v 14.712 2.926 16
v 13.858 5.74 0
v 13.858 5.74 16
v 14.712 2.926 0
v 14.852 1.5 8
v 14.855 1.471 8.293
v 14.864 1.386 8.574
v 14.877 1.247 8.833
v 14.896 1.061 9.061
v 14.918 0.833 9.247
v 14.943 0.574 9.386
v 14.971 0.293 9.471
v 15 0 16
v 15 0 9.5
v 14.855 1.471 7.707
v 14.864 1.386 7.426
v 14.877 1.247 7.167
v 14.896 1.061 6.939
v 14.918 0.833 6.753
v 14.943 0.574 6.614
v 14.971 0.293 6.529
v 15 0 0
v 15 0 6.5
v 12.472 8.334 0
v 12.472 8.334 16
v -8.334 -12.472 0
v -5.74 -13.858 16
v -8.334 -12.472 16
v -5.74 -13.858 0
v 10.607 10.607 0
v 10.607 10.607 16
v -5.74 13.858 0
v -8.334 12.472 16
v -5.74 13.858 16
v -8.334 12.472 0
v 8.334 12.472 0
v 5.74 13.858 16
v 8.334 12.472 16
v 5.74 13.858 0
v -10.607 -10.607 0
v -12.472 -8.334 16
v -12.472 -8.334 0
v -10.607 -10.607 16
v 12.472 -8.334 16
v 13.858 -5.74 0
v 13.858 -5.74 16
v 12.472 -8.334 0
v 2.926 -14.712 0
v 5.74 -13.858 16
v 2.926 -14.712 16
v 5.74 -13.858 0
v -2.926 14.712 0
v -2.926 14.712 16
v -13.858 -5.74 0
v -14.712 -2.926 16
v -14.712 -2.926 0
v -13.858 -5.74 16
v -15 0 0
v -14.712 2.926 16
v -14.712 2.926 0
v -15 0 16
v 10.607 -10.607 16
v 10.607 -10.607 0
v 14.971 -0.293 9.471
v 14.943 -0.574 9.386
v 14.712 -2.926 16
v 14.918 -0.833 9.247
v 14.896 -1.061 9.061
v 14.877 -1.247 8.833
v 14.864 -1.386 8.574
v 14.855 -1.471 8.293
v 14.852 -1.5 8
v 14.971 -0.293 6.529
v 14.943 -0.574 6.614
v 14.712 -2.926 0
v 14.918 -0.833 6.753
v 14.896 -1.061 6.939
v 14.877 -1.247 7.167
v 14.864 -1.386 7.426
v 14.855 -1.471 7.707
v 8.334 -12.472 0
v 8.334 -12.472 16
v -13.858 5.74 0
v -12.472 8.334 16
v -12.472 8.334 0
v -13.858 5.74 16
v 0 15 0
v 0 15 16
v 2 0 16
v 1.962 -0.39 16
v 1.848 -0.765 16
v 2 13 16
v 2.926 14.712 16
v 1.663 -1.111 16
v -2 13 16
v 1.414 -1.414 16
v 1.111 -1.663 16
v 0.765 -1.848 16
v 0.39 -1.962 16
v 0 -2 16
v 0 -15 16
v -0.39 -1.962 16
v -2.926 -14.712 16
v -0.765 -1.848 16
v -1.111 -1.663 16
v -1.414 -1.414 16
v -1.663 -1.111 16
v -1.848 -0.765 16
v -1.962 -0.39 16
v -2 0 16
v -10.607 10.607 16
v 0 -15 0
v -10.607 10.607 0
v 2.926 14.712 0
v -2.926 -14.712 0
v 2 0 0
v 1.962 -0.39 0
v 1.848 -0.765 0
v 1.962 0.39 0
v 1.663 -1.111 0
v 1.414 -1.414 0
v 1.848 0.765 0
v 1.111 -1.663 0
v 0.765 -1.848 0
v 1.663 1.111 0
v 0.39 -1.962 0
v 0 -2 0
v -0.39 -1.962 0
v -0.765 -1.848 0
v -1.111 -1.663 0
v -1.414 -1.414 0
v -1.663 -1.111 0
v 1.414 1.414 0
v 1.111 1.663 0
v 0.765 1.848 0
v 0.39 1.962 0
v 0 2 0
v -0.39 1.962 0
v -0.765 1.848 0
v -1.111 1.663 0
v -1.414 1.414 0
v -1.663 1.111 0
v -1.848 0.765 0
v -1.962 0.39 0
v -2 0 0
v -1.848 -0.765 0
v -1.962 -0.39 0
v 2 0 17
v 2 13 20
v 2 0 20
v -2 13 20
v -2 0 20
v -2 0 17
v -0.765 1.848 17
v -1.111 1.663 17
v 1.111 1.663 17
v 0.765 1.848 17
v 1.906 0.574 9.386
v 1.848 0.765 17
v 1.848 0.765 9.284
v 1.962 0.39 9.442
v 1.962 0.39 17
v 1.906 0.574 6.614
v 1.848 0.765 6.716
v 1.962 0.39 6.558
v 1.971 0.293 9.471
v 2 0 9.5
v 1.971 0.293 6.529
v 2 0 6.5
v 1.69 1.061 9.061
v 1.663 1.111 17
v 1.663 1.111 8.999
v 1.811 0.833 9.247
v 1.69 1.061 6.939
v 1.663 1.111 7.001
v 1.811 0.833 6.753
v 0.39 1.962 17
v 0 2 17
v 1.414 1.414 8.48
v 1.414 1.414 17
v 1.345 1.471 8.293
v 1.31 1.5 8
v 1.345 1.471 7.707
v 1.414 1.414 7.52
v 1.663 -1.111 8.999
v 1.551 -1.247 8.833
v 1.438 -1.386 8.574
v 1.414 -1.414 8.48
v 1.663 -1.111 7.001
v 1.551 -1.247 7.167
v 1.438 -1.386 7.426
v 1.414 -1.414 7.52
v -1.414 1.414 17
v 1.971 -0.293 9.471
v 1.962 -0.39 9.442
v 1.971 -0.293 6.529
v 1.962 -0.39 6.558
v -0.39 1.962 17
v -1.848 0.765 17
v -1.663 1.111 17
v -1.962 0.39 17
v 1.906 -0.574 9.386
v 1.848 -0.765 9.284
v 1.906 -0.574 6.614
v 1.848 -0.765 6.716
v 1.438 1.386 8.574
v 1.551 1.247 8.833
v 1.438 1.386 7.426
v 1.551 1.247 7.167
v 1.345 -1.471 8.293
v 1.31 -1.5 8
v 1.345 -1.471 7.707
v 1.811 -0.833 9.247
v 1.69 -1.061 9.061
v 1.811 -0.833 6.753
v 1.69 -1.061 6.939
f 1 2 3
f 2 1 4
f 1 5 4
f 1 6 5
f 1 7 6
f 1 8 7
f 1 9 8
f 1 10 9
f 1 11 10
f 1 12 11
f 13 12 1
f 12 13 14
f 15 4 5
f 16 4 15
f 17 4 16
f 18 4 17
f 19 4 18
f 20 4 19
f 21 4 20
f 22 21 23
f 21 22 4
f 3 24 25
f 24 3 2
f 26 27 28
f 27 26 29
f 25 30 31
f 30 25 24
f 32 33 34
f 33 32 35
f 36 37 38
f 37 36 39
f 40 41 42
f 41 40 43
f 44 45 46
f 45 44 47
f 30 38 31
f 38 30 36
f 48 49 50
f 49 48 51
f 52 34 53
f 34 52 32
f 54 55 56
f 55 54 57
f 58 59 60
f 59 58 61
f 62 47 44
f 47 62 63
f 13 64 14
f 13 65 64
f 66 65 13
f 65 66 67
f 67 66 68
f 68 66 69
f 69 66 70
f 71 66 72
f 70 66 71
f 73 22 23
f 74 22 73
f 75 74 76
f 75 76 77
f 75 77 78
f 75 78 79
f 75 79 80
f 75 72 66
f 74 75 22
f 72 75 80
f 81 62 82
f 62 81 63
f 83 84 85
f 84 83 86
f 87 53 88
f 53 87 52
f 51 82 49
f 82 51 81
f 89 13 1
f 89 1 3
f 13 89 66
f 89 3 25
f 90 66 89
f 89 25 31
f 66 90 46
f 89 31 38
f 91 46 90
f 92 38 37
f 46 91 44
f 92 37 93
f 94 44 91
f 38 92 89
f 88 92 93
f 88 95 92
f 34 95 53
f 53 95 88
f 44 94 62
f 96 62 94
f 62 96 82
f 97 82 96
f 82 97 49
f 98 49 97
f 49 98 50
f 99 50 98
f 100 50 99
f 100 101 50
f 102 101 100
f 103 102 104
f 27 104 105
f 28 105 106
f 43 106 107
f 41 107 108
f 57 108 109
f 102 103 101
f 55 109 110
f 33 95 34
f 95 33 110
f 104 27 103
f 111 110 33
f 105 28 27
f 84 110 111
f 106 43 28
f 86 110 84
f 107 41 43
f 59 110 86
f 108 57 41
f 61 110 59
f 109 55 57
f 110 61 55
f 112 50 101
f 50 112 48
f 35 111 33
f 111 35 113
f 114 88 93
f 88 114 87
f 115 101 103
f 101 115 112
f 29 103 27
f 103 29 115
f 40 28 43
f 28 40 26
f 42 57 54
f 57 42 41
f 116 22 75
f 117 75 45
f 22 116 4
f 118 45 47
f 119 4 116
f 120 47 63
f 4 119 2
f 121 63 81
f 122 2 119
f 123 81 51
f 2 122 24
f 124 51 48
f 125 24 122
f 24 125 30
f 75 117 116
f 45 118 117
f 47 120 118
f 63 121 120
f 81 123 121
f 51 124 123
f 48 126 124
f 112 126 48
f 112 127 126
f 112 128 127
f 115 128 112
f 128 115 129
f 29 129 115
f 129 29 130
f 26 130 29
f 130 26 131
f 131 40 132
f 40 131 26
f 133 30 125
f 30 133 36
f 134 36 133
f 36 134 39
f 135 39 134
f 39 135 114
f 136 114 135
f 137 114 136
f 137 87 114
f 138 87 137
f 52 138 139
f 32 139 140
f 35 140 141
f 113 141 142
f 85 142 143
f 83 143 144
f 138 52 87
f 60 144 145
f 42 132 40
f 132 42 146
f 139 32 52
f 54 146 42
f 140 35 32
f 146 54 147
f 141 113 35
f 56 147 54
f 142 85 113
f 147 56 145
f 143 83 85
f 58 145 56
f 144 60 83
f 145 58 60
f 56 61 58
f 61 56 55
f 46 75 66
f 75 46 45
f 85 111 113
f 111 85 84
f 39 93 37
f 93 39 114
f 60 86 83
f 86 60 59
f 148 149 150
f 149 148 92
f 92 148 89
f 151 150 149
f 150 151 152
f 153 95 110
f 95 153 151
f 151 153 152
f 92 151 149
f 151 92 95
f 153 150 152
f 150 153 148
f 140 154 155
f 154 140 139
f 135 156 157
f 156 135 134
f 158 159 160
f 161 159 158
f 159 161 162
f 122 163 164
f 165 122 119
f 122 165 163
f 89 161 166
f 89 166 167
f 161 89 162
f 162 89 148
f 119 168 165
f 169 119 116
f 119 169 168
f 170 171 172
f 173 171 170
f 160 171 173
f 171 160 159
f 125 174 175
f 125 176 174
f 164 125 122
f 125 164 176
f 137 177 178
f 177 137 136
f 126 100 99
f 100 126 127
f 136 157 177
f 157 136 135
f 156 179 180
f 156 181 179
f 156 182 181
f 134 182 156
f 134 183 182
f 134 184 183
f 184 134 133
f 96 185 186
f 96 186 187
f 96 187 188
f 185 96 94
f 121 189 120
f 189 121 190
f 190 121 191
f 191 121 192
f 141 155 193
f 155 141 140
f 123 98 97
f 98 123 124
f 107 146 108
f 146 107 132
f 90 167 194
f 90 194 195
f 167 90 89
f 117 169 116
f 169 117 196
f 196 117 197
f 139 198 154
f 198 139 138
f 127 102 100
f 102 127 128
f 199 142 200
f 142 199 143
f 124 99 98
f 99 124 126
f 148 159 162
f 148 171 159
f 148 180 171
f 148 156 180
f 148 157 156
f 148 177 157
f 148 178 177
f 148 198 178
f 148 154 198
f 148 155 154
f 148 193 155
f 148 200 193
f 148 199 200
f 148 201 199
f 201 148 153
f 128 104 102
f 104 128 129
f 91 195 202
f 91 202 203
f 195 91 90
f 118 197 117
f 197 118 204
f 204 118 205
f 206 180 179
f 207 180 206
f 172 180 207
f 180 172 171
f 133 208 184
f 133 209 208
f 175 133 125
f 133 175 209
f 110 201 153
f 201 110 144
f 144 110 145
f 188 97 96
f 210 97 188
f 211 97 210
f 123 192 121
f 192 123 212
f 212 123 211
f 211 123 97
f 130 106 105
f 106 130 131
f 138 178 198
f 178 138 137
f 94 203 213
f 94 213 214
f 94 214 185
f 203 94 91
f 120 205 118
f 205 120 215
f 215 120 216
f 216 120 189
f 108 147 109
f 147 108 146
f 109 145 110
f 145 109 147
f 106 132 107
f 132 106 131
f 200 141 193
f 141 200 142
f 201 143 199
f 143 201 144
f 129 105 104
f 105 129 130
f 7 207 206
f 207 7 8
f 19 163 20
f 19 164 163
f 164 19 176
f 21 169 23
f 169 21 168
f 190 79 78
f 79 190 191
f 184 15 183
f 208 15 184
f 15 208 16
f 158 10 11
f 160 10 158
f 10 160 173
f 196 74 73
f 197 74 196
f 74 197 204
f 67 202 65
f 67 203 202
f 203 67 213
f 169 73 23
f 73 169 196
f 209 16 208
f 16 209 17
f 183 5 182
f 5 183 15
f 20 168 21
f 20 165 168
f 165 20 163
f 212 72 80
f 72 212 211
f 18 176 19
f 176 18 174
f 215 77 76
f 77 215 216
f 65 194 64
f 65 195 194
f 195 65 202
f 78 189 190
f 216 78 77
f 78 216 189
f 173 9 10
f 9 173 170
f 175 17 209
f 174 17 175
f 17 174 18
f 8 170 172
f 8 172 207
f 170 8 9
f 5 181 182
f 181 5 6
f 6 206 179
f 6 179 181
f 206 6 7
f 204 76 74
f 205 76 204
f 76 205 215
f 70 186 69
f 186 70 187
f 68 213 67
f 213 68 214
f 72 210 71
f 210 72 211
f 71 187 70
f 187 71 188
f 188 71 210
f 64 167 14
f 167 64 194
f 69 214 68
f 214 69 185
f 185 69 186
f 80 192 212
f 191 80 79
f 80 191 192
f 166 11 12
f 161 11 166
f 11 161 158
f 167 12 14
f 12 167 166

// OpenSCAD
$fn = 32;

// ----------------------------------------------------------------------
// Control knob: pointer knob
// ----------------------------------------------------------------------

// --- parameters (mm) ---
rib_w = 4;                // pointer rib width
rib_h = 5;                // pointer rib height
knob_d = 30;              // knob body diameter
knob_h = 16;              // knob body height
bore_d = 4;               // shaft bore diameter
set_d = 3;                // set screw bore diameter

rib_poke = rib_h - 1;  // rib height above the top
total_h = knob_h + rib_h - 1;  // overall height

difference() {
  union() {
    cylinder(h = knob_h, d = knob_d);
    translate([-rib_w / 2, 0, knob_h - 1])
      cube([rib_w, knob_d / 2 - 2, rib_h]);
  }
  translate([0, 0, -1]) cylinder(h = knob_h + 2, d = bore_d);
  translate([-1, 0, knob_h / 2]) rotate([0, 90, 0])
    cylinder(h = knob_d / 2 + bore_d / 2 + 2, d = set_d);}
